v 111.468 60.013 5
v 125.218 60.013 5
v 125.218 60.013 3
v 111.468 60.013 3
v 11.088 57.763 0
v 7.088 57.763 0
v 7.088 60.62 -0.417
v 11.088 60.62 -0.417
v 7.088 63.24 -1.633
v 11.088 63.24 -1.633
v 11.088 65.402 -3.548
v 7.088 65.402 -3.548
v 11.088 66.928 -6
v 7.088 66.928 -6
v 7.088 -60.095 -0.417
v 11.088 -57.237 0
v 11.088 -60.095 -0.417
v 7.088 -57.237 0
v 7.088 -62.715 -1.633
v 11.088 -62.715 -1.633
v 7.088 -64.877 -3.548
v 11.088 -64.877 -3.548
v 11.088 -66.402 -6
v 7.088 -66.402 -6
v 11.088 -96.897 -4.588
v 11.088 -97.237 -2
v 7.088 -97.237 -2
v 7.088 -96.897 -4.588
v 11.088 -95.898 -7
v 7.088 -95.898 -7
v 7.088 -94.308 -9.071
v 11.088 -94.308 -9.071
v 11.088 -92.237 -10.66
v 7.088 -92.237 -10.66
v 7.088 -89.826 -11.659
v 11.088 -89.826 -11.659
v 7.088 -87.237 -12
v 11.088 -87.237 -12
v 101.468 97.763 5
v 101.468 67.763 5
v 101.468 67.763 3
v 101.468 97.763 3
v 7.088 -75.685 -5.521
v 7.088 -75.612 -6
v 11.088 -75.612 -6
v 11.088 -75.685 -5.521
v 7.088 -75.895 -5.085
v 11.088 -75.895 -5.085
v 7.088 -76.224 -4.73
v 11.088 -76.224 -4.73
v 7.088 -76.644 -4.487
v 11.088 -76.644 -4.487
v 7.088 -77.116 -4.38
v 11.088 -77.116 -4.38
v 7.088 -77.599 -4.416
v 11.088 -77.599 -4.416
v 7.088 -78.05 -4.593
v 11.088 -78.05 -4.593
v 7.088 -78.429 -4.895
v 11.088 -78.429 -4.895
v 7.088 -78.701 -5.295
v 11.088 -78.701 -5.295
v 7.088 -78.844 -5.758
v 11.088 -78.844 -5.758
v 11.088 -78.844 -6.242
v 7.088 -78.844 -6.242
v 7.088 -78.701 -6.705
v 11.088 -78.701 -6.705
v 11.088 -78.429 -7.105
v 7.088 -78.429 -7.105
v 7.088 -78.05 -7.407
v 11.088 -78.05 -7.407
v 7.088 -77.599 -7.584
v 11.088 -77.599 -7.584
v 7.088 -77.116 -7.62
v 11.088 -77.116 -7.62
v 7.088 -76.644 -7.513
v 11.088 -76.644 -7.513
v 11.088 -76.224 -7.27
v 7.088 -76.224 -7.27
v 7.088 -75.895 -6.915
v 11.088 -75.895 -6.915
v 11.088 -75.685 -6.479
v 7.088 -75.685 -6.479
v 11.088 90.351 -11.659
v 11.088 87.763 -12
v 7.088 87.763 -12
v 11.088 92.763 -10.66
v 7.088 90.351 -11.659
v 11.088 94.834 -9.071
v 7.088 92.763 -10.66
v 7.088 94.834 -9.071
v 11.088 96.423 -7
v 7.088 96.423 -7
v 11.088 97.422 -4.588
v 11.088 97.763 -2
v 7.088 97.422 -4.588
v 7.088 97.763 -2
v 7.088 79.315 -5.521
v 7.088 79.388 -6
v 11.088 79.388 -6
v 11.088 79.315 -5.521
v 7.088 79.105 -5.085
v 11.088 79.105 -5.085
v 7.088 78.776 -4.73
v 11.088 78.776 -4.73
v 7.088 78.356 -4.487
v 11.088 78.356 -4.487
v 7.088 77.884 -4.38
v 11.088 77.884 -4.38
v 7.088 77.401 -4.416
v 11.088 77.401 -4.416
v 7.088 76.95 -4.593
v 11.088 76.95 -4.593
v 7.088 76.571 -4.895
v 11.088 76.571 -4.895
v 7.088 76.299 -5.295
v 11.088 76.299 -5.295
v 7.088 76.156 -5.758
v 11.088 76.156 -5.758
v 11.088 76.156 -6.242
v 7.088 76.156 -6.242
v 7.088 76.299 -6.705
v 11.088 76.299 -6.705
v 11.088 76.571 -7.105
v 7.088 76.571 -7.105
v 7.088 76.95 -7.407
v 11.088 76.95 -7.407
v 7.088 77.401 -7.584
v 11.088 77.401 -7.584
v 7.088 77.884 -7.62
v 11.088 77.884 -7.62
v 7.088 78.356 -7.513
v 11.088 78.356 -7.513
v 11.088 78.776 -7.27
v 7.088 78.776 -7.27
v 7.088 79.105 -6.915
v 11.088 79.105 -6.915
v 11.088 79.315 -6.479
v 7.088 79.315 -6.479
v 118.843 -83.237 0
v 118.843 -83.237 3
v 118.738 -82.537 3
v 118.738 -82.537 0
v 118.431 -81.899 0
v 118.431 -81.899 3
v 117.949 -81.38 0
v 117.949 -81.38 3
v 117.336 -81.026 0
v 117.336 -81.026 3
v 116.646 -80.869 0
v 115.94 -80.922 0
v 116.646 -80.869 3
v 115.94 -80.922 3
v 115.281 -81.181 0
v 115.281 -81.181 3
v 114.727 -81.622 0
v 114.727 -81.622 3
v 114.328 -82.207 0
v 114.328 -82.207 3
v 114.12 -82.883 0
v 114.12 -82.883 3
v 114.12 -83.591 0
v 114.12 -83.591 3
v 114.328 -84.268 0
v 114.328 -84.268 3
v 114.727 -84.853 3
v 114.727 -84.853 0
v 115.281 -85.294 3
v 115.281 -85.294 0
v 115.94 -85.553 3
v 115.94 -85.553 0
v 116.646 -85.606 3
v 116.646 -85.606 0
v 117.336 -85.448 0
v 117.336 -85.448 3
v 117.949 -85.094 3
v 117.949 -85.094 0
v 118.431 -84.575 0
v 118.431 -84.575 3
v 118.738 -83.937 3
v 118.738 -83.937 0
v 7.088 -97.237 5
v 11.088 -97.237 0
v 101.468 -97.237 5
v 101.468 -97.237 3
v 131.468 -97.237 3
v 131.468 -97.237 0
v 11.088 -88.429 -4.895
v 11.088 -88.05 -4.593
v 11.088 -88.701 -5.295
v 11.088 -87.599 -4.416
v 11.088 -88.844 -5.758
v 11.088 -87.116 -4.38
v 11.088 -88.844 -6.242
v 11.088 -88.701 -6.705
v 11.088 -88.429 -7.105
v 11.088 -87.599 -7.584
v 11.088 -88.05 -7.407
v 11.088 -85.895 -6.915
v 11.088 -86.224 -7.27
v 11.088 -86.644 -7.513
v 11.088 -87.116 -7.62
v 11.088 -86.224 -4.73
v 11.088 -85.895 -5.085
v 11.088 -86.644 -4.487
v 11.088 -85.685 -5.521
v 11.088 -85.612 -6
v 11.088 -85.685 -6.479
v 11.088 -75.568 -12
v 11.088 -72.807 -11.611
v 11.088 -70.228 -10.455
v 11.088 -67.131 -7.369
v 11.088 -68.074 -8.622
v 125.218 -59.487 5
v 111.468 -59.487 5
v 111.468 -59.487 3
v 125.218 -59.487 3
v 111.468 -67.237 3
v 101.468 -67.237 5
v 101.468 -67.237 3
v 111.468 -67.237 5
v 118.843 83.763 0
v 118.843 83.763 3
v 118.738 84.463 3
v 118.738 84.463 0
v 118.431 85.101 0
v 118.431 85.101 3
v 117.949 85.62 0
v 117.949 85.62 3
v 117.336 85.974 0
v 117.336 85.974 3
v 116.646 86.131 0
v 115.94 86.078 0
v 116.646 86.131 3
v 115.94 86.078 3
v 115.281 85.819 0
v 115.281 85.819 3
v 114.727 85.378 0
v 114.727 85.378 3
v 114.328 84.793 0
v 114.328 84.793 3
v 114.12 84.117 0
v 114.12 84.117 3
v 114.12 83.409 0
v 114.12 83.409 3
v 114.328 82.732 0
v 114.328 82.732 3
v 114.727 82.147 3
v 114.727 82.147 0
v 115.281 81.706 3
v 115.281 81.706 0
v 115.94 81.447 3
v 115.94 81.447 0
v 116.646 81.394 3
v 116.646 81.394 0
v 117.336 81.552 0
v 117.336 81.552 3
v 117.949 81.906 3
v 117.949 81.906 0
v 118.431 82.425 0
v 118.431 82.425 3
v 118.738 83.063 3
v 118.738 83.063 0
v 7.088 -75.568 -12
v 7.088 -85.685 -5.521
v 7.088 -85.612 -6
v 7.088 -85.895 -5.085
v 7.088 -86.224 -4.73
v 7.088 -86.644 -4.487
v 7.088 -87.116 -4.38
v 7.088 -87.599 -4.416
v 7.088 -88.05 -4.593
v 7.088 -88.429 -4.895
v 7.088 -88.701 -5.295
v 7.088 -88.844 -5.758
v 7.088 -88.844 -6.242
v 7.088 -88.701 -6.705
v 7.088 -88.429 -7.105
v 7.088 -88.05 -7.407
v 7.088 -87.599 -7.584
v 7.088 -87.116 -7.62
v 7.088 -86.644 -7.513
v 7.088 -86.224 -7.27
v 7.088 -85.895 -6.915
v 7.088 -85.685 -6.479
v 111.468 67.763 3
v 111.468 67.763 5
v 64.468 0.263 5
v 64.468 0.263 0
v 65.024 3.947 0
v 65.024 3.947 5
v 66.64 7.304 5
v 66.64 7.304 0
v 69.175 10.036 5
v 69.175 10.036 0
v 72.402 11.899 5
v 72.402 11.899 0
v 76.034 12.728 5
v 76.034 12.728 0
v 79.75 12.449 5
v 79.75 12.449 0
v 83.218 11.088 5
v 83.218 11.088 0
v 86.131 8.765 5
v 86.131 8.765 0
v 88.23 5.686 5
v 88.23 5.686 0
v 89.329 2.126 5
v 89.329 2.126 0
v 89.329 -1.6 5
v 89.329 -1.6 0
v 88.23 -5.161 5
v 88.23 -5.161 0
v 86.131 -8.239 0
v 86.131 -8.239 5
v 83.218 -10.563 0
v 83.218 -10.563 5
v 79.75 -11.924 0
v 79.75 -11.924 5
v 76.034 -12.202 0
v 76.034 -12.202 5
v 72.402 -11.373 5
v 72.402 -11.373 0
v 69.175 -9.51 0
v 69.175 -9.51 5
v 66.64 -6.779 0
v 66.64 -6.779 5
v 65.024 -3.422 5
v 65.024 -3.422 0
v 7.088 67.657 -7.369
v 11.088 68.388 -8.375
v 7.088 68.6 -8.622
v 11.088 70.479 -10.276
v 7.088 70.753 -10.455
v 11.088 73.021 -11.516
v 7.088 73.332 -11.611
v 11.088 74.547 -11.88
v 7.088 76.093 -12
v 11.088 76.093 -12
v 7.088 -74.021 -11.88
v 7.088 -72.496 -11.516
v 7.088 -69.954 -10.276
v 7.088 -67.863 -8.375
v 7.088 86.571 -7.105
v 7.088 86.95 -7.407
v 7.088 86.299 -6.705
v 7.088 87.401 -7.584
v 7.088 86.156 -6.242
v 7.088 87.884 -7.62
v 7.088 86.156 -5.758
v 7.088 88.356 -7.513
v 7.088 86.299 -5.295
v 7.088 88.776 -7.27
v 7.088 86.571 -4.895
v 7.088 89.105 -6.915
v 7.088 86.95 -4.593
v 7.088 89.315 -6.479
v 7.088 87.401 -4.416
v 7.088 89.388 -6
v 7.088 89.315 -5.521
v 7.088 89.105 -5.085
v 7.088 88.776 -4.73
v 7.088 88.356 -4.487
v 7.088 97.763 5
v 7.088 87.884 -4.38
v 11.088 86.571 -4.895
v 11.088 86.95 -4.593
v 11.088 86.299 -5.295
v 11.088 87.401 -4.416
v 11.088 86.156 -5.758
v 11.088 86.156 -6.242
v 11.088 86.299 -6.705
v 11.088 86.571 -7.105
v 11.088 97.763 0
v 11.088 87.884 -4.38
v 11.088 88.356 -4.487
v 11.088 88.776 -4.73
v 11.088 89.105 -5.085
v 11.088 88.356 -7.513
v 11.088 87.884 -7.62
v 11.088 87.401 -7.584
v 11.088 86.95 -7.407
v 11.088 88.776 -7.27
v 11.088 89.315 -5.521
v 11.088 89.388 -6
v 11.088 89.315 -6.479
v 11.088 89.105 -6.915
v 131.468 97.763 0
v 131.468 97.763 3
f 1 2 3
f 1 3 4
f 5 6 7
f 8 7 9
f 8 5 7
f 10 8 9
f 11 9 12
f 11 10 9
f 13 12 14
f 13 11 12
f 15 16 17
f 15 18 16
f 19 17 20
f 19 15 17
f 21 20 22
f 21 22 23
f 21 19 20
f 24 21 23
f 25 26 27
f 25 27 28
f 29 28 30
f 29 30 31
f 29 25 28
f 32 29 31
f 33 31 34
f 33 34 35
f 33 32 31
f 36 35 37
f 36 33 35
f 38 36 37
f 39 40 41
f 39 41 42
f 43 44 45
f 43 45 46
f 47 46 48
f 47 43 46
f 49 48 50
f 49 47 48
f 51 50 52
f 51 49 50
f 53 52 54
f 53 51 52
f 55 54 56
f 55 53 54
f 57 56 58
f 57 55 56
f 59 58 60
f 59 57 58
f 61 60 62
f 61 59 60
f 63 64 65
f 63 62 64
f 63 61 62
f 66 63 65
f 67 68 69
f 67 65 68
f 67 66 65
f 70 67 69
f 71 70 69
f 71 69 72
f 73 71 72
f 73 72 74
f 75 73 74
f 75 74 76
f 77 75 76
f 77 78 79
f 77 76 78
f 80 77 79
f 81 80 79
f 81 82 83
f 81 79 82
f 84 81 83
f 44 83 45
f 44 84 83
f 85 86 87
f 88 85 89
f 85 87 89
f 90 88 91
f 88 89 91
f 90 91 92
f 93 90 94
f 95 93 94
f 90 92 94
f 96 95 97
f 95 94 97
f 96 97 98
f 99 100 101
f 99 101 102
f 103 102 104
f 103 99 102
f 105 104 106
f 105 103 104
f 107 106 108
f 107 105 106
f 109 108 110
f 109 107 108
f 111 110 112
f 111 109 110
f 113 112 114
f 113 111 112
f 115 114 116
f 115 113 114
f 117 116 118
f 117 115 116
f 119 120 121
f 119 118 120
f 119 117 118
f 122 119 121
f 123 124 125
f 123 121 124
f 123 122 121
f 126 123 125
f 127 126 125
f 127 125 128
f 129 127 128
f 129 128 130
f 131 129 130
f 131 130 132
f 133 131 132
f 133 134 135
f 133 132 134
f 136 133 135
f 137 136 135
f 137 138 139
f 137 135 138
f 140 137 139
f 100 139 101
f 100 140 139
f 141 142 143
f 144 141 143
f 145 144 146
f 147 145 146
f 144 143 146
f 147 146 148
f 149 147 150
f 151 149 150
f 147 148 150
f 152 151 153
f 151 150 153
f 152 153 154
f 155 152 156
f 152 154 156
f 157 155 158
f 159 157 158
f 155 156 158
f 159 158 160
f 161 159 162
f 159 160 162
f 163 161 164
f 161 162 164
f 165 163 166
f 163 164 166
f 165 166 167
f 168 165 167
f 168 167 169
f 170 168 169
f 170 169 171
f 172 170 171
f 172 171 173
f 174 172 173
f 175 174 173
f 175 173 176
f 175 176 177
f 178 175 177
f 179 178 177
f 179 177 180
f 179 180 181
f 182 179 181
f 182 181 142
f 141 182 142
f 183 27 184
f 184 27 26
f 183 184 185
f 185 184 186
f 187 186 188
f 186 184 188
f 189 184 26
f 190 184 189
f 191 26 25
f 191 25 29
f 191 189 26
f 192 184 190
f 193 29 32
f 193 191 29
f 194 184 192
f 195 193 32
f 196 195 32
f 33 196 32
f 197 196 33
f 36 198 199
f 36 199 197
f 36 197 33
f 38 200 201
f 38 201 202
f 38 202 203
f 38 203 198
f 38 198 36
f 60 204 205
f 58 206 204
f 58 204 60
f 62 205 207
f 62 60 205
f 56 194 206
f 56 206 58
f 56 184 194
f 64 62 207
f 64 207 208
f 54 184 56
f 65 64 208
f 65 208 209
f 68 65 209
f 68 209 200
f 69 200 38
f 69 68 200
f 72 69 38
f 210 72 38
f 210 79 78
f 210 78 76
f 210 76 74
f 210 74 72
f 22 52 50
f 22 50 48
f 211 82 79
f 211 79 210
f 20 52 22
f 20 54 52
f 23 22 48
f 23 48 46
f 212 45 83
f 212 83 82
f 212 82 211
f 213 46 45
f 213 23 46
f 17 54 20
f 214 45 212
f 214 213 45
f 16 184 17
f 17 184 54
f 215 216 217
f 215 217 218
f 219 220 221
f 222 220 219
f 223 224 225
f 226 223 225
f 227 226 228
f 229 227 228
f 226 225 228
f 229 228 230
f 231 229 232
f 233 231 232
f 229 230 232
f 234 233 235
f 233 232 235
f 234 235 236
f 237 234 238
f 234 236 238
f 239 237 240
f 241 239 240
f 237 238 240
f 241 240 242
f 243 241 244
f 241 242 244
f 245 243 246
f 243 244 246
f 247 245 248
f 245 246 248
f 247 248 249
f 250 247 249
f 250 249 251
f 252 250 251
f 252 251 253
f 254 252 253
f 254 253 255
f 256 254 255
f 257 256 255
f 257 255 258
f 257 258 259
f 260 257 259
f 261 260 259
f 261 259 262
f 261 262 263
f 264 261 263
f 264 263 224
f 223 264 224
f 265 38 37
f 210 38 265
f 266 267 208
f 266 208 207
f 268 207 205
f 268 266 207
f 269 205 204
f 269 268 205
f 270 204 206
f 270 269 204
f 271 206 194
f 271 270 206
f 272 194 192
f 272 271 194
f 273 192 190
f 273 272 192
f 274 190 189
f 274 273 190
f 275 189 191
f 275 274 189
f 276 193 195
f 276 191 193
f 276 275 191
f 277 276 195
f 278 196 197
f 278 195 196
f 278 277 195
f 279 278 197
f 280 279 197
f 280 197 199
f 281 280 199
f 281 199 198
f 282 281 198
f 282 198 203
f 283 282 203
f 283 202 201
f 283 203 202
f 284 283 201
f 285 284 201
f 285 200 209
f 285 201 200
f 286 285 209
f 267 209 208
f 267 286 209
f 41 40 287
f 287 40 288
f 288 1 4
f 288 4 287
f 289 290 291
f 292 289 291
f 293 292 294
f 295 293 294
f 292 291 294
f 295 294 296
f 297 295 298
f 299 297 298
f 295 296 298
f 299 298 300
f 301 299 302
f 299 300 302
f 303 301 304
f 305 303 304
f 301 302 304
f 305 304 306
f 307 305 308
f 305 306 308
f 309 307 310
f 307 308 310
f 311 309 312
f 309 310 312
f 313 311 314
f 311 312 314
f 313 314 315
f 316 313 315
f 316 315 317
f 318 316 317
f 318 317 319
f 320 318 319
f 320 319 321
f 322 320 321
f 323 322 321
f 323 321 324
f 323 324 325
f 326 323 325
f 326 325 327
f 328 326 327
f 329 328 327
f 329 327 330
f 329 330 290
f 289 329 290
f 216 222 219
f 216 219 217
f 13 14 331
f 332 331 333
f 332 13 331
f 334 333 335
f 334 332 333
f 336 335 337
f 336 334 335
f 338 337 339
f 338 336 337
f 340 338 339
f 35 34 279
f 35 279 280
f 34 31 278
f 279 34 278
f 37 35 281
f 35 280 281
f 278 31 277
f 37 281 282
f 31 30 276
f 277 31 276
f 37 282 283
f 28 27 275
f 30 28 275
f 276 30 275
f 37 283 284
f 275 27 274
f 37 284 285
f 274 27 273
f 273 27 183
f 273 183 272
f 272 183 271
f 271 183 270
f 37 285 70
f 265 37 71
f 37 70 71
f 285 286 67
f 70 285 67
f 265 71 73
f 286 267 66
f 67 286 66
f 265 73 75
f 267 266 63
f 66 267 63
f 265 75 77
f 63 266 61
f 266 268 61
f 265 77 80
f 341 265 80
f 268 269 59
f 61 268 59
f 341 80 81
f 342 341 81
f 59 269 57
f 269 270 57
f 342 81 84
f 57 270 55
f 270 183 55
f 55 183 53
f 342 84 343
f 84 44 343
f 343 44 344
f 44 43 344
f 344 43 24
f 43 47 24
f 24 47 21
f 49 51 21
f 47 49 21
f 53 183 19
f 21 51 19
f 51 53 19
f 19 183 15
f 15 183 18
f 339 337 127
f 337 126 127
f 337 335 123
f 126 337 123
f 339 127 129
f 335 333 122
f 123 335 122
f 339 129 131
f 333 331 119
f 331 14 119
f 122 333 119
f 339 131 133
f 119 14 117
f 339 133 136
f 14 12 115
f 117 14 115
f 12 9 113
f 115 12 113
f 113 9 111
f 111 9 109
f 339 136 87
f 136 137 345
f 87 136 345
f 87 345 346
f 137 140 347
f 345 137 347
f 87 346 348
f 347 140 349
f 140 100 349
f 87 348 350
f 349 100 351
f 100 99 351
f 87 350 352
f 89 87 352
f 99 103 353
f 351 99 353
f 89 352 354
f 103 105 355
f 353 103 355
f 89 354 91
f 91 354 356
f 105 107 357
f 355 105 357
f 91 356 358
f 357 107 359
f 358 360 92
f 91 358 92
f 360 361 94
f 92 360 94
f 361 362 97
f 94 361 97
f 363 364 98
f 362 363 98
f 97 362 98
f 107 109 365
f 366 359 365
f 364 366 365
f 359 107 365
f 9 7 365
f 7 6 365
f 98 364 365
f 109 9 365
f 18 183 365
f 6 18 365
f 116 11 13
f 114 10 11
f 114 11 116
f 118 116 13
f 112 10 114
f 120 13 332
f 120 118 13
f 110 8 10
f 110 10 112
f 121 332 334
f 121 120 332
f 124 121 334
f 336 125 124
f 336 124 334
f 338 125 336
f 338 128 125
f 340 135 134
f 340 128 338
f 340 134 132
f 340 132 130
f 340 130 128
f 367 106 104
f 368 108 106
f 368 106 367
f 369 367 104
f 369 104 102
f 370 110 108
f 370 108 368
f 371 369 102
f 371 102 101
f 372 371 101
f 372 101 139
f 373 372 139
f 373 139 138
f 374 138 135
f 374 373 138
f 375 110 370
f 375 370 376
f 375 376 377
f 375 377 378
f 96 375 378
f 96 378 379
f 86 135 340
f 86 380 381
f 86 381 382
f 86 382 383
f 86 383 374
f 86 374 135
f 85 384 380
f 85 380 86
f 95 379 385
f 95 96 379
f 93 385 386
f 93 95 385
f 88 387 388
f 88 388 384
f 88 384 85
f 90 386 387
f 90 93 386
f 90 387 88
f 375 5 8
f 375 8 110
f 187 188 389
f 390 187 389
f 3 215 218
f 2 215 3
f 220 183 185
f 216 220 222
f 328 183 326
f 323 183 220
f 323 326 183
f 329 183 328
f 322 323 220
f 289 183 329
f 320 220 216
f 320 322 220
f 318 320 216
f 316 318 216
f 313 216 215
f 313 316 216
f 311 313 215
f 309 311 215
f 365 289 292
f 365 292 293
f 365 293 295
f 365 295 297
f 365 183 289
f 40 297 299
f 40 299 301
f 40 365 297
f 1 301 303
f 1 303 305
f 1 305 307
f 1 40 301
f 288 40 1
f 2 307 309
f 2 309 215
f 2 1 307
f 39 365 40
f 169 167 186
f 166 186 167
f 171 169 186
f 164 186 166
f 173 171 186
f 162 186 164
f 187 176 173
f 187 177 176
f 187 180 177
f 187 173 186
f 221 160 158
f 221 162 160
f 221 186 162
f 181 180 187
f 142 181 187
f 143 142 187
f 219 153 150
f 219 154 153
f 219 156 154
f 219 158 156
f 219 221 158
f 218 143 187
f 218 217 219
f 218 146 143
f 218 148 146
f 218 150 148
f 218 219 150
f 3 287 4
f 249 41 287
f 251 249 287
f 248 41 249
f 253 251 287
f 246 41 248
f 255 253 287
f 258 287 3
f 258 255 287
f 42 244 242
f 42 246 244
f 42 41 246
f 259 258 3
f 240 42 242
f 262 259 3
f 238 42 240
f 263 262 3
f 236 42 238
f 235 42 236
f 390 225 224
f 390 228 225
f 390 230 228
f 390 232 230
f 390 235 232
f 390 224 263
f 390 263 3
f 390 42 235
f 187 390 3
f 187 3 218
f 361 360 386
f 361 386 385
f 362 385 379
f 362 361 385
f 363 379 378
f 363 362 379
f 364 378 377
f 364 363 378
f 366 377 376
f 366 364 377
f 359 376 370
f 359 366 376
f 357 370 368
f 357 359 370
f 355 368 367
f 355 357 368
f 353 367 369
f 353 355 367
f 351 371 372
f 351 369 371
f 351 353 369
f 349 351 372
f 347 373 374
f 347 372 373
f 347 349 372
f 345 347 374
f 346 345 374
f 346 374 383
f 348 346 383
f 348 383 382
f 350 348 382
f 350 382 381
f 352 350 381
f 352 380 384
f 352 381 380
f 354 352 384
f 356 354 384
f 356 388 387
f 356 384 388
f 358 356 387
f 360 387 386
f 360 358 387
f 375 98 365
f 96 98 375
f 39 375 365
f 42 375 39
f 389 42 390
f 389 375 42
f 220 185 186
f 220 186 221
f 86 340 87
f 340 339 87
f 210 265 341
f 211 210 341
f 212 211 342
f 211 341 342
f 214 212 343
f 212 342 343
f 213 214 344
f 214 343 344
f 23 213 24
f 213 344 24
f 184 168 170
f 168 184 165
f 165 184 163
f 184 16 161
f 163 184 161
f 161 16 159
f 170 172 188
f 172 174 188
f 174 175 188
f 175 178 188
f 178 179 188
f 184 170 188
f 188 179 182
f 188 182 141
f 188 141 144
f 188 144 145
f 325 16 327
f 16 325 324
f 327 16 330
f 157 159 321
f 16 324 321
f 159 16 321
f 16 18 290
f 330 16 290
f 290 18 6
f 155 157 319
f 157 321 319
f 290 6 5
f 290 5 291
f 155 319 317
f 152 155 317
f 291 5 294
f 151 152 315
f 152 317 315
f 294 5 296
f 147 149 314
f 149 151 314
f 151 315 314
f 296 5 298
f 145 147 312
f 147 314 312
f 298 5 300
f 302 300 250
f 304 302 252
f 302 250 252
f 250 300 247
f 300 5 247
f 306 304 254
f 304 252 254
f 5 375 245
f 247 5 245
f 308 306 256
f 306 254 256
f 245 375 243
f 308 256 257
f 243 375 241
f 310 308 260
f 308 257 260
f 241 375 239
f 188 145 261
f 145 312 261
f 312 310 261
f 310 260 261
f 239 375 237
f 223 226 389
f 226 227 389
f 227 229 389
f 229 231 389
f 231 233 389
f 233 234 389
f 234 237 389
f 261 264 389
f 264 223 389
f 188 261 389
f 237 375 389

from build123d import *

# Parameters (mm, degrees)
CROQUIS1_W                  = 248.76
CROQUIS1_H                  = 195
SALIENTE_EXTRUIR1_DEPTH     = 5
CROQUIS2_W                  = 48
CROQUIS2_H                  = 30
CROQUIS2_W_2                = 30
CORTAR_EXTRUIR1_DEPTH       = 2
CROQUIS3_R                  = 2.375
CORTAR_EXTRUIR2_DEPTH       = 10
CROQUIS4_R                  = 40
SALIENTE_EXTRUIR2_DEPTH     = 206
CROQUIS5_R                  = 12.5
CORTAR_EXTRUIR3_DEPTH       = 10
CROQUIS12_W                 = 12
CROQUIS12_H                 = 30
SALIENTE_EXTRUIR3_DEPTH     = 4
REDONDEO1_R                 = 10
REDONDEO2_R                 = 10
REDONDEO3_R                 = 10
CORTAR_EXTRUIR5_DEPTH       = 262.677217236
CORTAR_EXTRUIR5_DEPTH_BACK  = 262.677217236
CROQUIS13_R                 = 1.625
CORTAR_EXTRUIR7_DEPTH       = 2
CROQUIS16_R                 = 1.75
CORTAR_EXTRUIR9_DEPTH       = 20
CORTAR_EXTRUIR16_DEPTH      = 264.206105047
CORTAR_EXTRUIR16_DEPTH_BACK = 264.206105047
CROQUIS14_W                 = 124.38
CROQUIS14_H                 = 195


with BuildPart() as part:
    # Croquis1 → Saliente-Extruir1 (new body)
    with BuildSketch(Plane.XY):
        with Locations((7.088293187, 0.26268)):
            Rectangle(CROQUIS1_W, CROQUIS1_H)
    extrude(amount=SALIENTE_EXTRUIR1_DEPTH)

    # Croquis2 → Cortar-Extruir1 (cut)
    with BuildSketch(Plane.XY.offset(5)):
        with Locations((-93.291706813, -82.23732)):
            Rectangle(CROQUIS2_W, CROQUIS2_H)
        with Locations((116.468293187, 82.76268)):
            Rectangle(CROQUIS2_W_2, CROQUIS2_H)
        with Locations((116.468293187, -82.23732)):
            Rectangle(CROQUIS2_W_2, CROQUIS2_H)
        with Locations((-93.291706813, 82.76268)):
            Rectangle(CROQUIS2_W, CROQUIS2_H)
    extrude(amount=-CORTAR_EXTRUIR1_DEPTH, mode=Mode.SUBTRACT)

    # Croquis3 → Cortar-Extruir2 (cut)
    with BuildSketch(Plane.XY.offset(5)):
        with Locations((-93.291706813, 83.76268)):
            Circle(CROQUIS3_R)
        with Locations((-93.291706813, -83.23732)):
            Circle(CROQUIS3_R)
        with Locations((116.468293187, 83.76268)):
            Circle(CROQUIS3_R)
        with Locations((116.468293187, -83.23732)):
            Circle(CROQUIS3_R)
    extrude(amount=-CORTAR_EXTRUIR2_DEPTH, mode=Mode.SUBTRACT)

    # Croquis4 → Saliente-Extruir2 (add)
    with BuildSketch(Plane(origin=(0, 0, 0), x_dir=(-1, 0, 0), z_dir=(0, 0, -1))):
        with Locations(Location((55.101706813, 0.26268, 0), (0, 0, 180))):
            Circle(CROQUIS4_R)
    extrude(amount=SALIENTE_EXTRUIR2_DEPTH)

    # Croquis5 → Cortar-Extruir3 (cut)
    with BuildSketch(Plane(origin=(0, 0, 0), x_dir=(-1, 0, 0), z_dir=(0, 0, -1))):
        with Locations((-76.968293187, 0.26268)):
            Circle(CROQUIS5_R)
    extrude(amount=-CORTAR_EXTRUIR3_DEPTH, mode=Mode.SUBTRACT)

    # Croquis12 → Saliente-Extruir3 (add, symmetric)
    with BuildSketch(Plane(origin=(7.088293187, 0, 0), x_dir=(0, 0, -1), z_dir=(1, 0, 0))):
        with Locations((6, 82.76268)):
            Rectangle(CROQUIS12_W, CROQUIS12_H)
        with Locations((6, -82.23732)):
            Rectangle(CROQUIS12_W, CROQUIS12_H)
    extrude(amount=SALIENTE_EXTRUIR3_DEPTH, both=True)

    # Redondeo1
    redondeo1_edges = [part.edges().sort_by_distance(p)[0] for p in [
        (7.088293187, 67.76268, 0),
        (7.088293187, -67.23732, 0),
    ]]
    fillet(redondeo1_edges, radius=REDONDEO1_R)

    # Redondeo2
    redondeo2_edges = [part.edges().sort_by_distance(p)[0] for p in [
        (7.088293187, 67.76268, -12),
        (7.088293187, -67.23732, -12),
    ]]
    fillet(redondeo2_edges, radius=REDONDEO2_R)

    # Redondeo3
    redondeo3_edges = [part.edges().sort_by_distance(p)[0] for p in [
        (7.088293187, 97.76268, -12),
        (7.088293187, -97.23732, -12),
    ]]
    fillet(redondeo3_edges, radius=REDONDEO3_R)

    # Croquis13 → Cortar-Extruir5 (cut, two sides: drawn at the far end of the back side and taken through both)
    with BuildSketch(Plane(origin=(11.088293187, 0, 0), x_dir=(0, 0, -1), z_dir=(1, 0, 0)).offset(-CORTAR_EXTRUIR5_DEPTH_BACK)):
        with Locations(Location((6, 87.76268, 0), (0, 0, 90))):
            Circle(CROQUIS13_R)
        with Locations(Location((6, 77.76268, 0), (0, 0, 90))):
            Circle(CROQUIS13_R)
        with Locations(Location((6, -77.23732, 0), (0, 0, 90))):
            Circle(CROQUIS13_R)
        with Locations(Location((6, -87.23732, 0), (0, 0, 90))):
            Circle(CROQUIS13_R)
    extrude(amount=CORTAR_EXTRUIR5_DEPTH + CORTAR_EXTRUIR5_DEPTH_BACK, mode=Mode.SUBTRACT)

    # Croquis15 → Cortar-Extruir7 (cut)
    with BuildSketch(Plane.XY.offset(5)):
        Polygon((111.468293187, 67.76268), (131.468293187, 67.76268), (131.468293187, -67.23732), (111.468293187, -67.23732), (111.468293187, -59.48732), (125.218293187, -59.48732), (125.218293187, 60.01268), (111.468293187, 60.01268), align=None)
    extrude(amount=-CORTAR_EXTRUIR7_DEPTH, mode=Mode.SUBTRACT)

    # Croquis16 → Cortar-Extruir9 (cut)
    with BuildSketch(Plane.XY.offset(5)):
        with Locations((-55.101706813, 20.26268)):
            Circle(CROQUIS16_R)
        with Locations((-35.101706813, 0.26268)):
            Circle(CROQUIS16_R)
        with Locations((-55.101706813, -19.73732)):
            Circle(CROQUIS16_R)
        with Locations((-75.101706813, 0.26268)):
            Circle(CROQUIS16_R)
    extrude(amount=-CORTAR_EXTRUIR9_DEPTH, mode=Mode.SUBTRACT)

    # Croquis14 → Cortar-Extruir16 (cut, two sides: drawn at the far end of the back side and taken through both)
    with BuildSketch(Plane(origin=(0, 0, 0), x_dir=(-1, 0, 0), z_dir=(0, 0, -1)).offset(-CORTAR_EXTRUIR16_DEPTH_BACK)):
        with Locations((55.101706813, 0.26268)):
            Rectangle(CROQUIS14_W, CROQUIS14_H)
    extrude(amount=CORTAR_EXTRUIR16_DEPTH + CORTAR_EXTRUIR16_DEPTH_BACK, mode=Mode.SUBTRACT)


solid = part.part
